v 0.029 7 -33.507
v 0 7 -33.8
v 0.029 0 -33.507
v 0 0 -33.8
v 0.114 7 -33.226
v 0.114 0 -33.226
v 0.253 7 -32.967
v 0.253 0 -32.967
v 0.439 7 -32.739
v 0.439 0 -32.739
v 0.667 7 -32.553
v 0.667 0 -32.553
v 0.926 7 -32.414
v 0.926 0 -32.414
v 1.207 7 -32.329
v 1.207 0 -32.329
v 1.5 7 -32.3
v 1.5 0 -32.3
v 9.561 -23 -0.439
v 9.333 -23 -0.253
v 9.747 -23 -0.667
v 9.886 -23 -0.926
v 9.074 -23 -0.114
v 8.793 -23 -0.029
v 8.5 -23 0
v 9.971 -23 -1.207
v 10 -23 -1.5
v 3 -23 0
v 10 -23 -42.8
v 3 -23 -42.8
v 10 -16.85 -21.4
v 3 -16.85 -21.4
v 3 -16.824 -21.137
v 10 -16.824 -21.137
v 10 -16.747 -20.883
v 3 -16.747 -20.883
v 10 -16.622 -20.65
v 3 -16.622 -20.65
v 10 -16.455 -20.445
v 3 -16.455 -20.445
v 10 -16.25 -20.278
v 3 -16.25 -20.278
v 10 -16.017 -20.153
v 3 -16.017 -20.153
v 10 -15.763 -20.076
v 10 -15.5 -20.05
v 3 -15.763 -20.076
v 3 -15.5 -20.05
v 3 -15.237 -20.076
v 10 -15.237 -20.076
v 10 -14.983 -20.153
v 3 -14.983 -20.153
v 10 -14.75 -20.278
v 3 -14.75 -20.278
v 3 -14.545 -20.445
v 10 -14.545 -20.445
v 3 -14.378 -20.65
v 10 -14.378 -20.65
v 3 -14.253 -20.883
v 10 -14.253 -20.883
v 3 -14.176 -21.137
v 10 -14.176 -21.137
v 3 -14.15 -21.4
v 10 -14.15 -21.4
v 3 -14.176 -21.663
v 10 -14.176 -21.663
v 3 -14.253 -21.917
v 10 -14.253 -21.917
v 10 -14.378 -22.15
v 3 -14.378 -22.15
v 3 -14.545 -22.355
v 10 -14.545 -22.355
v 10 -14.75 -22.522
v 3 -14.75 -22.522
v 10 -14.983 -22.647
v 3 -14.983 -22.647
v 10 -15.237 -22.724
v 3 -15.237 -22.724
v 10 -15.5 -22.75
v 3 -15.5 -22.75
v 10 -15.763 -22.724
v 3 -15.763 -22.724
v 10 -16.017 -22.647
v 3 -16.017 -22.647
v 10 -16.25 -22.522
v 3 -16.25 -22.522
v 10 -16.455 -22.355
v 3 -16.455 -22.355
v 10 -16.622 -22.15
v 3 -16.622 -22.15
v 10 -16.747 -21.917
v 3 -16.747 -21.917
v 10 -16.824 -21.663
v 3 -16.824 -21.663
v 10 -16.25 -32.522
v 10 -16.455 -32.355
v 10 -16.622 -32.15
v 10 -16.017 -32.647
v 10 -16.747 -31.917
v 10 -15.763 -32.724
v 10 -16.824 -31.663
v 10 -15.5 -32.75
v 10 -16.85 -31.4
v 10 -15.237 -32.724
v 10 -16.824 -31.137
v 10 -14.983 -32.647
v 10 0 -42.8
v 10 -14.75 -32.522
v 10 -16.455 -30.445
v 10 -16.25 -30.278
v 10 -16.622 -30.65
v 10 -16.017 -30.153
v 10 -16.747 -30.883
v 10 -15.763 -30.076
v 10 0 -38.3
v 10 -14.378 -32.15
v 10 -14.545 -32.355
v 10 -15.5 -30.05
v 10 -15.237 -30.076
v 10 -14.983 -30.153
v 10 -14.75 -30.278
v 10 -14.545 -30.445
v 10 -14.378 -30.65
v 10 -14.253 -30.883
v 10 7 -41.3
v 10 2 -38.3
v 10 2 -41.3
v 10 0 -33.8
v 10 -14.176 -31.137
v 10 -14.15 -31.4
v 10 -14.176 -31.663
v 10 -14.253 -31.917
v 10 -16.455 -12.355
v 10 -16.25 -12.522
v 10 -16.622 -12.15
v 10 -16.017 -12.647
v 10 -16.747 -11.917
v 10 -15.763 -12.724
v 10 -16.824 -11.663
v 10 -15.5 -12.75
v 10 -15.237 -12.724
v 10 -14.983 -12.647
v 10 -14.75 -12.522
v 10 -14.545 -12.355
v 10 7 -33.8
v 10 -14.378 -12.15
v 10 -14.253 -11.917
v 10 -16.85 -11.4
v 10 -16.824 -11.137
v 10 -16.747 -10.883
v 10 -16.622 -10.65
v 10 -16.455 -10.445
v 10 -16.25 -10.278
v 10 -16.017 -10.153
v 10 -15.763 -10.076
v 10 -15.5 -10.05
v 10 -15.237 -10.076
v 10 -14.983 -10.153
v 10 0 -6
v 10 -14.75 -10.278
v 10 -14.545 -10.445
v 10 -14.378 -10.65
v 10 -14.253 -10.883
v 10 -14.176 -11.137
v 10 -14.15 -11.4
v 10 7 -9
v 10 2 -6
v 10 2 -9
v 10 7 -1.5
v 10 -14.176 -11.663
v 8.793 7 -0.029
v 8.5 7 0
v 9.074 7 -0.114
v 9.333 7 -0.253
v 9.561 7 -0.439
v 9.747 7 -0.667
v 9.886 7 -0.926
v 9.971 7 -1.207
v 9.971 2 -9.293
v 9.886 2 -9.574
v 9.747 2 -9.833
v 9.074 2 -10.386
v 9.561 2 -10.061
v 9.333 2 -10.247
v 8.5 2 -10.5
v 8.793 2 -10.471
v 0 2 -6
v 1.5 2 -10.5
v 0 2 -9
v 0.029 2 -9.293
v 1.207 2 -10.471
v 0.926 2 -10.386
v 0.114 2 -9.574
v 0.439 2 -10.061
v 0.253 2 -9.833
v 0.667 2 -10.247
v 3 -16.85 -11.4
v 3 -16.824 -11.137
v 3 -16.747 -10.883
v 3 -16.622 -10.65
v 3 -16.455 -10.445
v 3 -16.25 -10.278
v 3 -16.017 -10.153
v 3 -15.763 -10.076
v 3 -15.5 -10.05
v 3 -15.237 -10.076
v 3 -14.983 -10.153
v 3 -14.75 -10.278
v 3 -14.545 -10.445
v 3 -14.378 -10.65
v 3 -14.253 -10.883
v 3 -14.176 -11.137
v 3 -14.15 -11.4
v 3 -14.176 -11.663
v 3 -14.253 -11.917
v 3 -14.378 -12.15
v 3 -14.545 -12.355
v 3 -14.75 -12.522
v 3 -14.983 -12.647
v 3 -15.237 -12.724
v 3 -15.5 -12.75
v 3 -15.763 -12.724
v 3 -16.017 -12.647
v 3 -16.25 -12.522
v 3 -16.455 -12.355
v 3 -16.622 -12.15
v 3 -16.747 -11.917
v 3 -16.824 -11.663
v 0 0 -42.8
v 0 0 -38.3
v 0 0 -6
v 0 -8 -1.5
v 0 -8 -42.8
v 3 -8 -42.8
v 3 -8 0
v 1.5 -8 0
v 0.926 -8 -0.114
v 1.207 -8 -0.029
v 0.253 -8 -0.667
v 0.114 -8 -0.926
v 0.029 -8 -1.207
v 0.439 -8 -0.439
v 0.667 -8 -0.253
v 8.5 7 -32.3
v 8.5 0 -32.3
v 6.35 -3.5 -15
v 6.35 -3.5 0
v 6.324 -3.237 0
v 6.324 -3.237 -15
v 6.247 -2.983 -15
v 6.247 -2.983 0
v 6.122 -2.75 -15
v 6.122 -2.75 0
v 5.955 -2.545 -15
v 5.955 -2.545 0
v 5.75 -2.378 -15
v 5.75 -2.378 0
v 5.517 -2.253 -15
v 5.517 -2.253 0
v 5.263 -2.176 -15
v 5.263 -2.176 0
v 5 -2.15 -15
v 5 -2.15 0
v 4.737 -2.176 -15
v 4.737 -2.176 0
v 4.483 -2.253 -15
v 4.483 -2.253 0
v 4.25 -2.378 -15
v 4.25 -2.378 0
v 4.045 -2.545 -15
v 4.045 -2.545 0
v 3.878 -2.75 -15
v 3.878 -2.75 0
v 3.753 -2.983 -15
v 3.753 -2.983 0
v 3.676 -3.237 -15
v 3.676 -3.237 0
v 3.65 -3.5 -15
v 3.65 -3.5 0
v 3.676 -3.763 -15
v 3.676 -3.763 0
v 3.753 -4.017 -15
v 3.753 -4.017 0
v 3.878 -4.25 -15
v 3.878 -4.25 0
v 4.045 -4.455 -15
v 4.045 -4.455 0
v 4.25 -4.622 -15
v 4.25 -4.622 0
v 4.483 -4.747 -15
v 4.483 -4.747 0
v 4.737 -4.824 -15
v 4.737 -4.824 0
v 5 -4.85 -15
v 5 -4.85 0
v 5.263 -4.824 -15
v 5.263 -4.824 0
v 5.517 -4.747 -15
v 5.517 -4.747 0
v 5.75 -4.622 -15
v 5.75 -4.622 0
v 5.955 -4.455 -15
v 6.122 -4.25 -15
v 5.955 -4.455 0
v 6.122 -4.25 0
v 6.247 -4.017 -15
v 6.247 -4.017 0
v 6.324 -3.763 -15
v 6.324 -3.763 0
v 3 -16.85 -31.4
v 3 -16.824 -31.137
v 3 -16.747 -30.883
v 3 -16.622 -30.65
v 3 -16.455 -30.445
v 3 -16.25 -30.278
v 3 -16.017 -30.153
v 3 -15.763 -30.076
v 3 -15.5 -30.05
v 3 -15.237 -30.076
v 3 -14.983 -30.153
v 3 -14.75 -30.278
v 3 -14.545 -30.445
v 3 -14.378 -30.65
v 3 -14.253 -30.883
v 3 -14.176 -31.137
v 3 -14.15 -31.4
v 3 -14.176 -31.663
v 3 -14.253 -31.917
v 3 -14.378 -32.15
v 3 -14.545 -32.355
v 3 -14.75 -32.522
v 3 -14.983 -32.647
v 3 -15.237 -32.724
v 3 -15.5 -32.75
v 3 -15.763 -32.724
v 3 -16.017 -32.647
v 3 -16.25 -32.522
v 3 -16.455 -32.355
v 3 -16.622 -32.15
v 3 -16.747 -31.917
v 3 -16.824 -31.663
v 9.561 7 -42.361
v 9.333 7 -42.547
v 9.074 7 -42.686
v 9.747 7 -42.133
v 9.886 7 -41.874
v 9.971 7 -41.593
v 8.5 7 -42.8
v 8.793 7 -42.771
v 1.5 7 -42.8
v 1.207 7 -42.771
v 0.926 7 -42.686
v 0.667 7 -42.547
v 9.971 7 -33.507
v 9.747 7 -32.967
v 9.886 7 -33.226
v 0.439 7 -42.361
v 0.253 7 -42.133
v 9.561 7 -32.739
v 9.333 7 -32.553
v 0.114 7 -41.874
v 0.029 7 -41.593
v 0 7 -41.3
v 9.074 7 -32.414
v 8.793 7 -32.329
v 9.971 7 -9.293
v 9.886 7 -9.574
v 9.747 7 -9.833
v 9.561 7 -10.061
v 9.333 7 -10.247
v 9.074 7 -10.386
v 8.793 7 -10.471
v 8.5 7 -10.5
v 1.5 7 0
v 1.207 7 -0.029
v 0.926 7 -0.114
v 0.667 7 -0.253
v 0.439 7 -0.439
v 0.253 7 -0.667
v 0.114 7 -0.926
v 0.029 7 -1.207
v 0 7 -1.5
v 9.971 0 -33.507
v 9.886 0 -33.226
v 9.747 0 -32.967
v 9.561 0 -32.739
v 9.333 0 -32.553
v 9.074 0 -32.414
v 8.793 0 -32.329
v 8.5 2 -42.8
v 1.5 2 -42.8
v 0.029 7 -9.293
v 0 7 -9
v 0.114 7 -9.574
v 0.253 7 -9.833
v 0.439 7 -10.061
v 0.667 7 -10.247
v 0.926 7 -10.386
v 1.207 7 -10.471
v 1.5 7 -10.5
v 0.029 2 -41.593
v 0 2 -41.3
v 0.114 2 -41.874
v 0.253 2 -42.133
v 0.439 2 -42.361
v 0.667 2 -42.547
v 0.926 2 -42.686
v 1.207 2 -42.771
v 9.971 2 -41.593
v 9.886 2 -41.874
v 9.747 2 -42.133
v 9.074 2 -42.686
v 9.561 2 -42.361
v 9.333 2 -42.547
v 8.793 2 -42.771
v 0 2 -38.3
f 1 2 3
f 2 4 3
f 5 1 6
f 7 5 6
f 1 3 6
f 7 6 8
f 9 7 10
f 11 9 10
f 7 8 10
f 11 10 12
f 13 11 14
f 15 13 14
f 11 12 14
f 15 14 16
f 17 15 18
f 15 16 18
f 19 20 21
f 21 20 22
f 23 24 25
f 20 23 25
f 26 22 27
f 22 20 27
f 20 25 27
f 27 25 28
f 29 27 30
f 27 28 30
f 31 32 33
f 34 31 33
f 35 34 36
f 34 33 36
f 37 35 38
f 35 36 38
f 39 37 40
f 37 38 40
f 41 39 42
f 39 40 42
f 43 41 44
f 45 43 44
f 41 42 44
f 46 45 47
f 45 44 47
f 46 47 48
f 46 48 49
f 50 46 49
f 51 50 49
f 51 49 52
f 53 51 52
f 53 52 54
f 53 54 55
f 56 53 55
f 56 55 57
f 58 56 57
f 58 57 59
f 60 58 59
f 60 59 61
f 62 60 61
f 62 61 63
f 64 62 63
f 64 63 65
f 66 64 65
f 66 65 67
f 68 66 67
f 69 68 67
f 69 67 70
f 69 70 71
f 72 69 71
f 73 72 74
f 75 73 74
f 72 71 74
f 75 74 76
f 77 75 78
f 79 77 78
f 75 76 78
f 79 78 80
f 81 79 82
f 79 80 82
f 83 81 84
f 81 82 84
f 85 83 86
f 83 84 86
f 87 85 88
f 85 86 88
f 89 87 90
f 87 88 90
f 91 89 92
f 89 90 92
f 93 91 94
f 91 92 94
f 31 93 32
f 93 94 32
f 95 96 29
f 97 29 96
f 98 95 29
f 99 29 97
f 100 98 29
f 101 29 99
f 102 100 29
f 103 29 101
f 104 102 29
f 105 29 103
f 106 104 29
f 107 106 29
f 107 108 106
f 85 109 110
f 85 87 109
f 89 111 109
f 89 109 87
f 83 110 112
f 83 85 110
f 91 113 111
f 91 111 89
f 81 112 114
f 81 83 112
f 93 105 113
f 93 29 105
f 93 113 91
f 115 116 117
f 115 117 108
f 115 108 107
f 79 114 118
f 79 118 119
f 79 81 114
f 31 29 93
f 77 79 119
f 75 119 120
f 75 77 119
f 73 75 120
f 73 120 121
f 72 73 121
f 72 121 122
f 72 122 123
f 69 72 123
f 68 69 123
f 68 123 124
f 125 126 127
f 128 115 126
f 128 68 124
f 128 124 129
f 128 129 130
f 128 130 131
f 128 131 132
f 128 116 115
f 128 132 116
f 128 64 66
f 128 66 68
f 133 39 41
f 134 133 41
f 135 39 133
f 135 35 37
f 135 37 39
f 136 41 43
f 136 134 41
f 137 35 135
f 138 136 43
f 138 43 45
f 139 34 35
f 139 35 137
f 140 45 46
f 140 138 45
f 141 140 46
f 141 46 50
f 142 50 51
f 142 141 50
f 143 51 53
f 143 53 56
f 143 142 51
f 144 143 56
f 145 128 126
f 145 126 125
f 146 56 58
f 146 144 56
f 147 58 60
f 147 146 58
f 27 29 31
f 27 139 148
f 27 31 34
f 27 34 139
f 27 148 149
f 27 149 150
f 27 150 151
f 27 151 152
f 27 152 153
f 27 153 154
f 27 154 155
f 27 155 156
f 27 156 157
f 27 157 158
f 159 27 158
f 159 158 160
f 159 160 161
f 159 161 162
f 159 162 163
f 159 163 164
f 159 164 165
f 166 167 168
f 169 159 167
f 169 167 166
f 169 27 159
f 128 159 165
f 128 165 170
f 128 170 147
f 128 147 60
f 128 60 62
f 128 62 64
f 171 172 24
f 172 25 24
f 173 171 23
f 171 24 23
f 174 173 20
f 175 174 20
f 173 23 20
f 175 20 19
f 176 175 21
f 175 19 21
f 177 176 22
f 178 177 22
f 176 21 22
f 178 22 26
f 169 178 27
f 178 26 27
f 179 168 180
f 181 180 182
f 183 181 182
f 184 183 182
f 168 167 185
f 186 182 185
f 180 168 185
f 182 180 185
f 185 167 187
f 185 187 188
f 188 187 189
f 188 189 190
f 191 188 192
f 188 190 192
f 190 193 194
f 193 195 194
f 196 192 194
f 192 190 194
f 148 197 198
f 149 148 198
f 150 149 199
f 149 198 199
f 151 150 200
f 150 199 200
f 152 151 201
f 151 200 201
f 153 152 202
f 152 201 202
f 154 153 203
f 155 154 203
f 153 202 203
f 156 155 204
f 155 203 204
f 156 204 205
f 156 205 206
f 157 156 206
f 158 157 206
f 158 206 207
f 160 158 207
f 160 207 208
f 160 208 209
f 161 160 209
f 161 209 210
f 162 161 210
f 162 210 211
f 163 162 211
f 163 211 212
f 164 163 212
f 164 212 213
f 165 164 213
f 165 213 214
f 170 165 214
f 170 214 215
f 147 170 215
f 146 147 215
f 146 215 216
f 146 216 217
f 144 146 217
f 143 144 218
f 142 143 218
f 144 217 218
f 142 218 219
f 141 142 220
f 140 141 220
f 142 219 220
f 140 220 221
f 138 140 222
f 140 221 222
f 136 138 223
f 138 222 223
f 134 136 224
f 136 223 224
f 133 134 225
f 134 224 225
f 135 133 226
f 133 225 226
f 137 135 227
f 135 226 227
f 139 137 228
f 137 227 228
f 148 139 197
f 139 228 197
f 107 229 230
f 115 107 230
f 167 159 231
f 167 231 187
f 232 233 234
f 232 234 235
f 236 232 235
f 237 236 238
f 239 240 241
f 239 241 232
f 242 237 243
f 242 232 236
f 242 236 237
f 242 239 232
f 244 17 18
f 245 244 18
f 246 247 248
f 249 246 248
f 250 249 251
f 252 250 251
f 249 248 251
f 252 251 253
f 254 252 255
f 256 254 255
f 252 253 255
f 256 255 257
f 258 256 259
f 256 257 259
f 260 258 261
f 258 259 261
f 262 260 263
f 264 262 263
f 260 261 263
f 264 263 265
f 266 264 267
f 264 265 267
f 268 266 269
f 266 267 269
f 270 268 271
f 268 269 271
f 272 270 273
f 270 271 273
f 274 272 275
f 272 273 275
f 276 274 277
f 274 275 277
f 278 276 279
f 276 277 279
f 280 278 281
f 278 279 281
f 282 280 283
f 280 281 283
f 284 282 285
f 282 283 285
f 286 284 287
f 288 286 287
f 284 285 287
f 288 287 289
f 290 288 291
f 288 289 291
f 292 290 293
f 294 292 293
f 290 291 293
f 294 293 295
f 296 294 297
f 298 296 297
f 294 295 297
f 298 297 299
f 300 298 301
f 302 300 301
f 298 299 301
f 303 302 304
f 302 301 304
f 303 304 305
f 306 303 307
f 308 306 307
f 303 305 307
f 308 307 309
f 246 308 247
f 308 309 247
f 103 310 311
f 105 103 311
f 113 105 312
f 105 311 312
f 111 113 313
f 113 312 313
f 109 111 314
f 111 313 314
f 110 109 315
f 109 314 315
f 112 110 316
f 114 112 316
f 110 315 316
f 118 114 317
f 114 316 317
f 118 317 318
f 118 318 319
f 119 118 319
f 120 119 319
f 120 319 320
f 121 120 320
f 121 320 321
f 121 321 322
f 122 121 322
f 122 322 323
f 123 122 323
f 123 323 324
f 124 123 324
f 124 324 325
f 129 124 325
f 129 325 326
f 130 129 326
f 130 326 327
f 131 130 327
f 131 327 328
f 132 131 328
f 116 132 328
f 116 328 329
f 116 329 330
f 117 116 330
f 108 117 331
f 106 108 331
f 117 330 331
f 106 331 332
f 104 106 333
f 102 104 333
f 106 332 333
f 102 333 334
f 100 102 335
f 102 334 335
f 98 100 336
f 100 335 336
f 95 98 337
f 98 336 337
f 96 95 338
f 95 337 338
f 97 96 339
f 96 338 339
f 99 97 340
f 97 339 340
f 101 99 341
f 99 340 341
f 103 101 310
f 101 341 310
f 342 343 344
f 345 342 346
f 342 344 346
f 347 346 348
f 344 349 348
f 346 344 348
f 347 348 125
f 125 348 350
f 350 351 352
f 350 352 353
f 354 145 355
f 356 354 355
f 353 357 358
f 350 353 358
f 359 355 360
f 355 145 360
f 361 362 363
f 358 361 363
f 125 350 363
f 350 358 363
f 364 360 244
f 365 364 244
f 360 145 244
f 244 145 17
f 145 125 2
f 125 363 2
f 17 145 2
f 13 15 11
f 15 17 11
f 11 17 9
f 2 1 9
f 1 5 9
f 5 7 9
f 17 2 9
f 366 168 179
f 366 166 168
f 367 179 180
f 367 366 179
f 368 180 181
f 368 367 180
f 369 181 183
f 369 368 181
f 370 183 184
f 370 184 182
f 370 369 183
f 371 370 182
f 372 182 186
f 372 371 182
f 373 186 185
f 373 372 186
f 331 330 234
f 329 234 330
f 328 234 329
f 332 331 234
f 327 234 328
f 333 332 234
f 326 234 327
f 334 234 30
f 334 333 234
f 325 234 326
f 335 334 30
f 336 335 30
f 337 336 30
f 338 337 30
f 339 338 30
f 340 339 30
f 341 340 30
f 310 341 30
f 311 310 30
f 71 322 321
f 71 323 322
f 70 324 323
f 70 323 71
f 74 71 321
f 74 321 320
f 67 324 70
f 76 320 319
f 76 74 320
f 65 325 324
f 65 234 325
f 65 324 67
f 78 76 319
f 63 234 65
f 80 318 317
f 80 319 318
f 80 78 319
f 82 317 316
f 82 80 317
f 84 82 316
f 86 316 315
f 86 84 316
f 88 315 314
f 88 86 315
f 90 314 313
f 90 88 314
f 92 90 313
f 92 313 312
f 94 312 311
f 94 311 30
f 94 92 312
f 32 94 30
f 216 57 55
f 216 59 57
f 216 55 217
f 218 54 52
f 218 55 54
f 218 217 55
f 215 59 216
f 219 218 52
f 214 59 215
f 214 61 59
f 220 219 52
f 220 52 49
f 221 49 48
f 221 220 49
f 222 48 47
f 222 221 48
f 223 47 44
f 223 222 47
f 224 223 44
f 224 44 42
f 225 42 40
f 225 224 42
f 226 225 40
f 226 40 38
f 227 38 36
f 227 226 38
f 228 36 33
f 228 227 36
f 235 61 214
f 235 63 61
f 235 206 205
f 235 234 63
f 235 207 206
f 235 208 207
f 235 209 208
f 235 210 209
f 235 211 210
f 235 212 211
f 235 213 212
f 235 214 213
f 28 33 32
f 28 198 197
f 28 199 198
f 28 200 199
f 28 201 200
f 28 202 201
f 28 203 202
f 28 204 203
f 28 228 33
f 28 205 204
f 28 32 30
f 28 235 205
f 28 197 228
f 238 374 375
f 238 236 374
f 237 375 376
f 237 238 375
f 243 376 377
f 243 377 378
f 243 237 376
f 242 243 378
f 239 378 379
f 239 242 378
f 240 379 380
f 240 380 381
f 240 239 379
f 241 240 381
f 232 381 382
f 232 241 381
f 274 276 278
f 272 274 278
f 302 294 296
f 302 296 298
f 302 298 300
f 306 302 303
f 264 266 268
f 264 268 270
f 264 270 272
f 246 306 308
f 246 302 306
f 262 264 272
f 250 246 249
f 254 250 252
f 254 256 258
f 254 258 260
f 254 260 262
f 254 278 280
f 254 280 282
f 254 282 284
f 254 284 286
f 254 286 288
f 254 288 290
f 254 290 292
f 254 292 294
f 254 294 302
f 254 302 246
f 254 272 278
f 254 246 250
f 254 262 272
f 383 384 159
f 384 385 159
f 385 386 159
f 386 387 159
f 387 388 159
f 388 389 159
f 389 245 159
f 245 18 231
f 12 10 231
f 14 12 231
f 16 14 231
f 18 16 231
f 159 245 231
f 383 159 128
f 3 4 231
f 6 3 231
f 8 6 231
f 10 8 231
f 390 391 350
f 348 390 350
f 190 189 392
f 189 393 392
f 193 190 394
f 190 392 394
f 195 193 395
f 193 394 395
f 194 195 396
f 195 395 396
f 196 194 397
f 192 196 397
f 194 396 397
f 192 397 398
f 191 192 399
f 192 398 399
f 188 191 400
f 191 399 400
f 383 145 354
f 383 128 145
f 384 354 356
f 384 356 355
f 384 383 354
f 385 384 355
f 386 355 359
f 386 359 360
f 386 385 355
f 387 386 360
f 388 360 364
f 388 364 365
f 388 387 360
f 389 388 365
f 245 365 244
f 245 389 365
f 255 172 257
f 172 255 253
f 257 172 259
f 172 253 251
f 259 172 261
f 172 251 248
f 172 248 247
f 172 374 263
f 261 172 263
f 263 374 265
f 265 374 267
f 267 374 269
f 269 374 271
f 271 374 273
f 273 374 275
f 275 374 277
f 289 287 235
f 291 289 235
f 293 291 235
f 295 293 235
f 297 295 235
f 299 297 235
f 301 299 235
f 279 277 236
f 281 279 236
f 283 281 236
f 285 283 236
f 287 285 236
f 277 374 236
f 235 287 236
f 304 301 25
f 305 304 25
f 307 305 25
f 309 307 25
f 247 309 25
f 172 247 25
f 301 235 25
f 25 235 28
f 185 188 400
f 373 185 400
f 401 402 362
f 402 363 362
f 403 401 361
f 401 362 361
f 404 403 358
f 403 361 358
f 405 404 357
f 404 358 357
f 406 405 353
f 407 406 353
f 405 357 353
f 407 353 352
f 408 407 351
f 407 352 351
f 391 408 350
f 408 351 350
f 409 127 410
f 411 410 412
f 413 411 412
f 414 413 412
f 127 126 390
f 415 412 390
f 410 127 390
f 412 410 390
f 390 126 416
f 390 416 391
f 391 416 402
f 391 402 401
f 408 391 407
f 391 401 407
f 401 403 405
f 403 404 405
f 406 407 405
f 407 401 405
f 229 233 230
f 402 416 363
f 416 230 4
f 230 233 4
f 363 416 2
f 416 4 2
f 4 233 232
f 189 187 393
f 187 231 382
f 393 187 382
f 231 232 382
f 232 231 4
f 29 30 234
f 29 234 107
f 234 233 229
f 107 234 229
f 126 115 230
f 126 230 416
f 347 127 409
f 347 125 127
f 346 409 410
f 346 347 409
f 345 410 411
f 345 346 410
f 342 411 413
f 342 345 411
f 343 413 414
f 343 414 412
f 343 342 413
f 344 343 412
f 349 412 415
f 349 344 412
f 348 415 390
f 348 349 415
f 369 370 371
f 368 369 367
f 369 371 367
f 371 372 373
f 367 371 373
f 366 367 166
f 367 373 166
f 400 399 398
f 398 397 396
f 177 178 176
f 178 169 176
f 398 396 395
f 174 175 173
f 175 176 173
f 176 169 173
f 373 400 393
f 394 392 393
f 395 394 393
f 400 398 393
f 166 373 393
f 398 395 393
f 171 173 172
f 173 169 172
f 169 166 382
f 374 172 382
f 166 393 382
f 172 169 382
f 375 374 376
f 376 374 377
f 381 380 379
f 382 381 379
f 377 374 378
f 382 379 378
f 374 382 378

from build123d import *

# Parameters (mm, degrees)
F1_DEPTH = 10
F2_R     = 1.35
F3_DEPTH = 15
F4_W     = 15
F4_H     = 42.8
F5_DEPTH = 3
F6_R     = 1.35
F7_DEPTH = 7.001
F8_R     = 1.5


with BuildPart() as f1:
    # F0 (on Right) → F1 (new body)
    with BuildSketch(Plane.YZ):
        Polygon((7, 0), (-23, 0), (-23, -42.8), (0, -42.8), (0, -38.3), (2, -38.3), (2, -42.8), (7, -42.8), (7, -32.3), (0, -32.3), (0, -6), (2, -6), (2, -10.5), (7, -10.5), align=None)
    extrude(amount=F1_DEPTH)

    # F2 (on face) → F3 (cut)
    with BuildSketch(Plane.XY):
        with Locations((5, -3.5)):
            Circle(F2_R)
    extrude(amount=-F3_DEPTH, mode=Mode.SUBTRACT)

    # F4 (on face) → F5 (cut)
    with BuildSketch(Plane(origin=(0, 0, 0), x_dir=(0, -1, 0), z_dir=(-1, 0, 0))):
        with Locations((15.5, -21.4)):
            Rectangle(F4_W, F4_H)
    extrude(amount=-F5_DEPTH, mode=Mode.SUBTRACT)

    # F6 (on face) → F7 (cut, through all)
    with BuildSketch(Plane(origin=(3, 0, 0), x_dir=(0, -1, 0), z_dir=(-1, 0, 0))):
        with Locations((15.5, -21.4)):
            Circle(F6_R)
        with Locations((15.5, -11.4)):
            Circle(F6_R)
        with Locations((15.5, -31.4)):
            Circle(F6_R)
    extrude(amount=-F7_DEPTH, mode=Mode.SUBTRACT)

    # F8
    f8_edges = [f1.edges().sort_by_distance(p)[0] for p in [
        (0, -0.5, 0),
        (10, -8, 0),
        (0, 4.5, -10.5),
        (0, 3.5, -32.3),
        (10, 3.5, -32.3),
        (10, 4.5, -10.5),
        (10, 4.5, -42.8),
        (0, 4.5, -42.8),
    ]]
    fillet(f8_edges, radius=F8_R)


solid = f1.part
